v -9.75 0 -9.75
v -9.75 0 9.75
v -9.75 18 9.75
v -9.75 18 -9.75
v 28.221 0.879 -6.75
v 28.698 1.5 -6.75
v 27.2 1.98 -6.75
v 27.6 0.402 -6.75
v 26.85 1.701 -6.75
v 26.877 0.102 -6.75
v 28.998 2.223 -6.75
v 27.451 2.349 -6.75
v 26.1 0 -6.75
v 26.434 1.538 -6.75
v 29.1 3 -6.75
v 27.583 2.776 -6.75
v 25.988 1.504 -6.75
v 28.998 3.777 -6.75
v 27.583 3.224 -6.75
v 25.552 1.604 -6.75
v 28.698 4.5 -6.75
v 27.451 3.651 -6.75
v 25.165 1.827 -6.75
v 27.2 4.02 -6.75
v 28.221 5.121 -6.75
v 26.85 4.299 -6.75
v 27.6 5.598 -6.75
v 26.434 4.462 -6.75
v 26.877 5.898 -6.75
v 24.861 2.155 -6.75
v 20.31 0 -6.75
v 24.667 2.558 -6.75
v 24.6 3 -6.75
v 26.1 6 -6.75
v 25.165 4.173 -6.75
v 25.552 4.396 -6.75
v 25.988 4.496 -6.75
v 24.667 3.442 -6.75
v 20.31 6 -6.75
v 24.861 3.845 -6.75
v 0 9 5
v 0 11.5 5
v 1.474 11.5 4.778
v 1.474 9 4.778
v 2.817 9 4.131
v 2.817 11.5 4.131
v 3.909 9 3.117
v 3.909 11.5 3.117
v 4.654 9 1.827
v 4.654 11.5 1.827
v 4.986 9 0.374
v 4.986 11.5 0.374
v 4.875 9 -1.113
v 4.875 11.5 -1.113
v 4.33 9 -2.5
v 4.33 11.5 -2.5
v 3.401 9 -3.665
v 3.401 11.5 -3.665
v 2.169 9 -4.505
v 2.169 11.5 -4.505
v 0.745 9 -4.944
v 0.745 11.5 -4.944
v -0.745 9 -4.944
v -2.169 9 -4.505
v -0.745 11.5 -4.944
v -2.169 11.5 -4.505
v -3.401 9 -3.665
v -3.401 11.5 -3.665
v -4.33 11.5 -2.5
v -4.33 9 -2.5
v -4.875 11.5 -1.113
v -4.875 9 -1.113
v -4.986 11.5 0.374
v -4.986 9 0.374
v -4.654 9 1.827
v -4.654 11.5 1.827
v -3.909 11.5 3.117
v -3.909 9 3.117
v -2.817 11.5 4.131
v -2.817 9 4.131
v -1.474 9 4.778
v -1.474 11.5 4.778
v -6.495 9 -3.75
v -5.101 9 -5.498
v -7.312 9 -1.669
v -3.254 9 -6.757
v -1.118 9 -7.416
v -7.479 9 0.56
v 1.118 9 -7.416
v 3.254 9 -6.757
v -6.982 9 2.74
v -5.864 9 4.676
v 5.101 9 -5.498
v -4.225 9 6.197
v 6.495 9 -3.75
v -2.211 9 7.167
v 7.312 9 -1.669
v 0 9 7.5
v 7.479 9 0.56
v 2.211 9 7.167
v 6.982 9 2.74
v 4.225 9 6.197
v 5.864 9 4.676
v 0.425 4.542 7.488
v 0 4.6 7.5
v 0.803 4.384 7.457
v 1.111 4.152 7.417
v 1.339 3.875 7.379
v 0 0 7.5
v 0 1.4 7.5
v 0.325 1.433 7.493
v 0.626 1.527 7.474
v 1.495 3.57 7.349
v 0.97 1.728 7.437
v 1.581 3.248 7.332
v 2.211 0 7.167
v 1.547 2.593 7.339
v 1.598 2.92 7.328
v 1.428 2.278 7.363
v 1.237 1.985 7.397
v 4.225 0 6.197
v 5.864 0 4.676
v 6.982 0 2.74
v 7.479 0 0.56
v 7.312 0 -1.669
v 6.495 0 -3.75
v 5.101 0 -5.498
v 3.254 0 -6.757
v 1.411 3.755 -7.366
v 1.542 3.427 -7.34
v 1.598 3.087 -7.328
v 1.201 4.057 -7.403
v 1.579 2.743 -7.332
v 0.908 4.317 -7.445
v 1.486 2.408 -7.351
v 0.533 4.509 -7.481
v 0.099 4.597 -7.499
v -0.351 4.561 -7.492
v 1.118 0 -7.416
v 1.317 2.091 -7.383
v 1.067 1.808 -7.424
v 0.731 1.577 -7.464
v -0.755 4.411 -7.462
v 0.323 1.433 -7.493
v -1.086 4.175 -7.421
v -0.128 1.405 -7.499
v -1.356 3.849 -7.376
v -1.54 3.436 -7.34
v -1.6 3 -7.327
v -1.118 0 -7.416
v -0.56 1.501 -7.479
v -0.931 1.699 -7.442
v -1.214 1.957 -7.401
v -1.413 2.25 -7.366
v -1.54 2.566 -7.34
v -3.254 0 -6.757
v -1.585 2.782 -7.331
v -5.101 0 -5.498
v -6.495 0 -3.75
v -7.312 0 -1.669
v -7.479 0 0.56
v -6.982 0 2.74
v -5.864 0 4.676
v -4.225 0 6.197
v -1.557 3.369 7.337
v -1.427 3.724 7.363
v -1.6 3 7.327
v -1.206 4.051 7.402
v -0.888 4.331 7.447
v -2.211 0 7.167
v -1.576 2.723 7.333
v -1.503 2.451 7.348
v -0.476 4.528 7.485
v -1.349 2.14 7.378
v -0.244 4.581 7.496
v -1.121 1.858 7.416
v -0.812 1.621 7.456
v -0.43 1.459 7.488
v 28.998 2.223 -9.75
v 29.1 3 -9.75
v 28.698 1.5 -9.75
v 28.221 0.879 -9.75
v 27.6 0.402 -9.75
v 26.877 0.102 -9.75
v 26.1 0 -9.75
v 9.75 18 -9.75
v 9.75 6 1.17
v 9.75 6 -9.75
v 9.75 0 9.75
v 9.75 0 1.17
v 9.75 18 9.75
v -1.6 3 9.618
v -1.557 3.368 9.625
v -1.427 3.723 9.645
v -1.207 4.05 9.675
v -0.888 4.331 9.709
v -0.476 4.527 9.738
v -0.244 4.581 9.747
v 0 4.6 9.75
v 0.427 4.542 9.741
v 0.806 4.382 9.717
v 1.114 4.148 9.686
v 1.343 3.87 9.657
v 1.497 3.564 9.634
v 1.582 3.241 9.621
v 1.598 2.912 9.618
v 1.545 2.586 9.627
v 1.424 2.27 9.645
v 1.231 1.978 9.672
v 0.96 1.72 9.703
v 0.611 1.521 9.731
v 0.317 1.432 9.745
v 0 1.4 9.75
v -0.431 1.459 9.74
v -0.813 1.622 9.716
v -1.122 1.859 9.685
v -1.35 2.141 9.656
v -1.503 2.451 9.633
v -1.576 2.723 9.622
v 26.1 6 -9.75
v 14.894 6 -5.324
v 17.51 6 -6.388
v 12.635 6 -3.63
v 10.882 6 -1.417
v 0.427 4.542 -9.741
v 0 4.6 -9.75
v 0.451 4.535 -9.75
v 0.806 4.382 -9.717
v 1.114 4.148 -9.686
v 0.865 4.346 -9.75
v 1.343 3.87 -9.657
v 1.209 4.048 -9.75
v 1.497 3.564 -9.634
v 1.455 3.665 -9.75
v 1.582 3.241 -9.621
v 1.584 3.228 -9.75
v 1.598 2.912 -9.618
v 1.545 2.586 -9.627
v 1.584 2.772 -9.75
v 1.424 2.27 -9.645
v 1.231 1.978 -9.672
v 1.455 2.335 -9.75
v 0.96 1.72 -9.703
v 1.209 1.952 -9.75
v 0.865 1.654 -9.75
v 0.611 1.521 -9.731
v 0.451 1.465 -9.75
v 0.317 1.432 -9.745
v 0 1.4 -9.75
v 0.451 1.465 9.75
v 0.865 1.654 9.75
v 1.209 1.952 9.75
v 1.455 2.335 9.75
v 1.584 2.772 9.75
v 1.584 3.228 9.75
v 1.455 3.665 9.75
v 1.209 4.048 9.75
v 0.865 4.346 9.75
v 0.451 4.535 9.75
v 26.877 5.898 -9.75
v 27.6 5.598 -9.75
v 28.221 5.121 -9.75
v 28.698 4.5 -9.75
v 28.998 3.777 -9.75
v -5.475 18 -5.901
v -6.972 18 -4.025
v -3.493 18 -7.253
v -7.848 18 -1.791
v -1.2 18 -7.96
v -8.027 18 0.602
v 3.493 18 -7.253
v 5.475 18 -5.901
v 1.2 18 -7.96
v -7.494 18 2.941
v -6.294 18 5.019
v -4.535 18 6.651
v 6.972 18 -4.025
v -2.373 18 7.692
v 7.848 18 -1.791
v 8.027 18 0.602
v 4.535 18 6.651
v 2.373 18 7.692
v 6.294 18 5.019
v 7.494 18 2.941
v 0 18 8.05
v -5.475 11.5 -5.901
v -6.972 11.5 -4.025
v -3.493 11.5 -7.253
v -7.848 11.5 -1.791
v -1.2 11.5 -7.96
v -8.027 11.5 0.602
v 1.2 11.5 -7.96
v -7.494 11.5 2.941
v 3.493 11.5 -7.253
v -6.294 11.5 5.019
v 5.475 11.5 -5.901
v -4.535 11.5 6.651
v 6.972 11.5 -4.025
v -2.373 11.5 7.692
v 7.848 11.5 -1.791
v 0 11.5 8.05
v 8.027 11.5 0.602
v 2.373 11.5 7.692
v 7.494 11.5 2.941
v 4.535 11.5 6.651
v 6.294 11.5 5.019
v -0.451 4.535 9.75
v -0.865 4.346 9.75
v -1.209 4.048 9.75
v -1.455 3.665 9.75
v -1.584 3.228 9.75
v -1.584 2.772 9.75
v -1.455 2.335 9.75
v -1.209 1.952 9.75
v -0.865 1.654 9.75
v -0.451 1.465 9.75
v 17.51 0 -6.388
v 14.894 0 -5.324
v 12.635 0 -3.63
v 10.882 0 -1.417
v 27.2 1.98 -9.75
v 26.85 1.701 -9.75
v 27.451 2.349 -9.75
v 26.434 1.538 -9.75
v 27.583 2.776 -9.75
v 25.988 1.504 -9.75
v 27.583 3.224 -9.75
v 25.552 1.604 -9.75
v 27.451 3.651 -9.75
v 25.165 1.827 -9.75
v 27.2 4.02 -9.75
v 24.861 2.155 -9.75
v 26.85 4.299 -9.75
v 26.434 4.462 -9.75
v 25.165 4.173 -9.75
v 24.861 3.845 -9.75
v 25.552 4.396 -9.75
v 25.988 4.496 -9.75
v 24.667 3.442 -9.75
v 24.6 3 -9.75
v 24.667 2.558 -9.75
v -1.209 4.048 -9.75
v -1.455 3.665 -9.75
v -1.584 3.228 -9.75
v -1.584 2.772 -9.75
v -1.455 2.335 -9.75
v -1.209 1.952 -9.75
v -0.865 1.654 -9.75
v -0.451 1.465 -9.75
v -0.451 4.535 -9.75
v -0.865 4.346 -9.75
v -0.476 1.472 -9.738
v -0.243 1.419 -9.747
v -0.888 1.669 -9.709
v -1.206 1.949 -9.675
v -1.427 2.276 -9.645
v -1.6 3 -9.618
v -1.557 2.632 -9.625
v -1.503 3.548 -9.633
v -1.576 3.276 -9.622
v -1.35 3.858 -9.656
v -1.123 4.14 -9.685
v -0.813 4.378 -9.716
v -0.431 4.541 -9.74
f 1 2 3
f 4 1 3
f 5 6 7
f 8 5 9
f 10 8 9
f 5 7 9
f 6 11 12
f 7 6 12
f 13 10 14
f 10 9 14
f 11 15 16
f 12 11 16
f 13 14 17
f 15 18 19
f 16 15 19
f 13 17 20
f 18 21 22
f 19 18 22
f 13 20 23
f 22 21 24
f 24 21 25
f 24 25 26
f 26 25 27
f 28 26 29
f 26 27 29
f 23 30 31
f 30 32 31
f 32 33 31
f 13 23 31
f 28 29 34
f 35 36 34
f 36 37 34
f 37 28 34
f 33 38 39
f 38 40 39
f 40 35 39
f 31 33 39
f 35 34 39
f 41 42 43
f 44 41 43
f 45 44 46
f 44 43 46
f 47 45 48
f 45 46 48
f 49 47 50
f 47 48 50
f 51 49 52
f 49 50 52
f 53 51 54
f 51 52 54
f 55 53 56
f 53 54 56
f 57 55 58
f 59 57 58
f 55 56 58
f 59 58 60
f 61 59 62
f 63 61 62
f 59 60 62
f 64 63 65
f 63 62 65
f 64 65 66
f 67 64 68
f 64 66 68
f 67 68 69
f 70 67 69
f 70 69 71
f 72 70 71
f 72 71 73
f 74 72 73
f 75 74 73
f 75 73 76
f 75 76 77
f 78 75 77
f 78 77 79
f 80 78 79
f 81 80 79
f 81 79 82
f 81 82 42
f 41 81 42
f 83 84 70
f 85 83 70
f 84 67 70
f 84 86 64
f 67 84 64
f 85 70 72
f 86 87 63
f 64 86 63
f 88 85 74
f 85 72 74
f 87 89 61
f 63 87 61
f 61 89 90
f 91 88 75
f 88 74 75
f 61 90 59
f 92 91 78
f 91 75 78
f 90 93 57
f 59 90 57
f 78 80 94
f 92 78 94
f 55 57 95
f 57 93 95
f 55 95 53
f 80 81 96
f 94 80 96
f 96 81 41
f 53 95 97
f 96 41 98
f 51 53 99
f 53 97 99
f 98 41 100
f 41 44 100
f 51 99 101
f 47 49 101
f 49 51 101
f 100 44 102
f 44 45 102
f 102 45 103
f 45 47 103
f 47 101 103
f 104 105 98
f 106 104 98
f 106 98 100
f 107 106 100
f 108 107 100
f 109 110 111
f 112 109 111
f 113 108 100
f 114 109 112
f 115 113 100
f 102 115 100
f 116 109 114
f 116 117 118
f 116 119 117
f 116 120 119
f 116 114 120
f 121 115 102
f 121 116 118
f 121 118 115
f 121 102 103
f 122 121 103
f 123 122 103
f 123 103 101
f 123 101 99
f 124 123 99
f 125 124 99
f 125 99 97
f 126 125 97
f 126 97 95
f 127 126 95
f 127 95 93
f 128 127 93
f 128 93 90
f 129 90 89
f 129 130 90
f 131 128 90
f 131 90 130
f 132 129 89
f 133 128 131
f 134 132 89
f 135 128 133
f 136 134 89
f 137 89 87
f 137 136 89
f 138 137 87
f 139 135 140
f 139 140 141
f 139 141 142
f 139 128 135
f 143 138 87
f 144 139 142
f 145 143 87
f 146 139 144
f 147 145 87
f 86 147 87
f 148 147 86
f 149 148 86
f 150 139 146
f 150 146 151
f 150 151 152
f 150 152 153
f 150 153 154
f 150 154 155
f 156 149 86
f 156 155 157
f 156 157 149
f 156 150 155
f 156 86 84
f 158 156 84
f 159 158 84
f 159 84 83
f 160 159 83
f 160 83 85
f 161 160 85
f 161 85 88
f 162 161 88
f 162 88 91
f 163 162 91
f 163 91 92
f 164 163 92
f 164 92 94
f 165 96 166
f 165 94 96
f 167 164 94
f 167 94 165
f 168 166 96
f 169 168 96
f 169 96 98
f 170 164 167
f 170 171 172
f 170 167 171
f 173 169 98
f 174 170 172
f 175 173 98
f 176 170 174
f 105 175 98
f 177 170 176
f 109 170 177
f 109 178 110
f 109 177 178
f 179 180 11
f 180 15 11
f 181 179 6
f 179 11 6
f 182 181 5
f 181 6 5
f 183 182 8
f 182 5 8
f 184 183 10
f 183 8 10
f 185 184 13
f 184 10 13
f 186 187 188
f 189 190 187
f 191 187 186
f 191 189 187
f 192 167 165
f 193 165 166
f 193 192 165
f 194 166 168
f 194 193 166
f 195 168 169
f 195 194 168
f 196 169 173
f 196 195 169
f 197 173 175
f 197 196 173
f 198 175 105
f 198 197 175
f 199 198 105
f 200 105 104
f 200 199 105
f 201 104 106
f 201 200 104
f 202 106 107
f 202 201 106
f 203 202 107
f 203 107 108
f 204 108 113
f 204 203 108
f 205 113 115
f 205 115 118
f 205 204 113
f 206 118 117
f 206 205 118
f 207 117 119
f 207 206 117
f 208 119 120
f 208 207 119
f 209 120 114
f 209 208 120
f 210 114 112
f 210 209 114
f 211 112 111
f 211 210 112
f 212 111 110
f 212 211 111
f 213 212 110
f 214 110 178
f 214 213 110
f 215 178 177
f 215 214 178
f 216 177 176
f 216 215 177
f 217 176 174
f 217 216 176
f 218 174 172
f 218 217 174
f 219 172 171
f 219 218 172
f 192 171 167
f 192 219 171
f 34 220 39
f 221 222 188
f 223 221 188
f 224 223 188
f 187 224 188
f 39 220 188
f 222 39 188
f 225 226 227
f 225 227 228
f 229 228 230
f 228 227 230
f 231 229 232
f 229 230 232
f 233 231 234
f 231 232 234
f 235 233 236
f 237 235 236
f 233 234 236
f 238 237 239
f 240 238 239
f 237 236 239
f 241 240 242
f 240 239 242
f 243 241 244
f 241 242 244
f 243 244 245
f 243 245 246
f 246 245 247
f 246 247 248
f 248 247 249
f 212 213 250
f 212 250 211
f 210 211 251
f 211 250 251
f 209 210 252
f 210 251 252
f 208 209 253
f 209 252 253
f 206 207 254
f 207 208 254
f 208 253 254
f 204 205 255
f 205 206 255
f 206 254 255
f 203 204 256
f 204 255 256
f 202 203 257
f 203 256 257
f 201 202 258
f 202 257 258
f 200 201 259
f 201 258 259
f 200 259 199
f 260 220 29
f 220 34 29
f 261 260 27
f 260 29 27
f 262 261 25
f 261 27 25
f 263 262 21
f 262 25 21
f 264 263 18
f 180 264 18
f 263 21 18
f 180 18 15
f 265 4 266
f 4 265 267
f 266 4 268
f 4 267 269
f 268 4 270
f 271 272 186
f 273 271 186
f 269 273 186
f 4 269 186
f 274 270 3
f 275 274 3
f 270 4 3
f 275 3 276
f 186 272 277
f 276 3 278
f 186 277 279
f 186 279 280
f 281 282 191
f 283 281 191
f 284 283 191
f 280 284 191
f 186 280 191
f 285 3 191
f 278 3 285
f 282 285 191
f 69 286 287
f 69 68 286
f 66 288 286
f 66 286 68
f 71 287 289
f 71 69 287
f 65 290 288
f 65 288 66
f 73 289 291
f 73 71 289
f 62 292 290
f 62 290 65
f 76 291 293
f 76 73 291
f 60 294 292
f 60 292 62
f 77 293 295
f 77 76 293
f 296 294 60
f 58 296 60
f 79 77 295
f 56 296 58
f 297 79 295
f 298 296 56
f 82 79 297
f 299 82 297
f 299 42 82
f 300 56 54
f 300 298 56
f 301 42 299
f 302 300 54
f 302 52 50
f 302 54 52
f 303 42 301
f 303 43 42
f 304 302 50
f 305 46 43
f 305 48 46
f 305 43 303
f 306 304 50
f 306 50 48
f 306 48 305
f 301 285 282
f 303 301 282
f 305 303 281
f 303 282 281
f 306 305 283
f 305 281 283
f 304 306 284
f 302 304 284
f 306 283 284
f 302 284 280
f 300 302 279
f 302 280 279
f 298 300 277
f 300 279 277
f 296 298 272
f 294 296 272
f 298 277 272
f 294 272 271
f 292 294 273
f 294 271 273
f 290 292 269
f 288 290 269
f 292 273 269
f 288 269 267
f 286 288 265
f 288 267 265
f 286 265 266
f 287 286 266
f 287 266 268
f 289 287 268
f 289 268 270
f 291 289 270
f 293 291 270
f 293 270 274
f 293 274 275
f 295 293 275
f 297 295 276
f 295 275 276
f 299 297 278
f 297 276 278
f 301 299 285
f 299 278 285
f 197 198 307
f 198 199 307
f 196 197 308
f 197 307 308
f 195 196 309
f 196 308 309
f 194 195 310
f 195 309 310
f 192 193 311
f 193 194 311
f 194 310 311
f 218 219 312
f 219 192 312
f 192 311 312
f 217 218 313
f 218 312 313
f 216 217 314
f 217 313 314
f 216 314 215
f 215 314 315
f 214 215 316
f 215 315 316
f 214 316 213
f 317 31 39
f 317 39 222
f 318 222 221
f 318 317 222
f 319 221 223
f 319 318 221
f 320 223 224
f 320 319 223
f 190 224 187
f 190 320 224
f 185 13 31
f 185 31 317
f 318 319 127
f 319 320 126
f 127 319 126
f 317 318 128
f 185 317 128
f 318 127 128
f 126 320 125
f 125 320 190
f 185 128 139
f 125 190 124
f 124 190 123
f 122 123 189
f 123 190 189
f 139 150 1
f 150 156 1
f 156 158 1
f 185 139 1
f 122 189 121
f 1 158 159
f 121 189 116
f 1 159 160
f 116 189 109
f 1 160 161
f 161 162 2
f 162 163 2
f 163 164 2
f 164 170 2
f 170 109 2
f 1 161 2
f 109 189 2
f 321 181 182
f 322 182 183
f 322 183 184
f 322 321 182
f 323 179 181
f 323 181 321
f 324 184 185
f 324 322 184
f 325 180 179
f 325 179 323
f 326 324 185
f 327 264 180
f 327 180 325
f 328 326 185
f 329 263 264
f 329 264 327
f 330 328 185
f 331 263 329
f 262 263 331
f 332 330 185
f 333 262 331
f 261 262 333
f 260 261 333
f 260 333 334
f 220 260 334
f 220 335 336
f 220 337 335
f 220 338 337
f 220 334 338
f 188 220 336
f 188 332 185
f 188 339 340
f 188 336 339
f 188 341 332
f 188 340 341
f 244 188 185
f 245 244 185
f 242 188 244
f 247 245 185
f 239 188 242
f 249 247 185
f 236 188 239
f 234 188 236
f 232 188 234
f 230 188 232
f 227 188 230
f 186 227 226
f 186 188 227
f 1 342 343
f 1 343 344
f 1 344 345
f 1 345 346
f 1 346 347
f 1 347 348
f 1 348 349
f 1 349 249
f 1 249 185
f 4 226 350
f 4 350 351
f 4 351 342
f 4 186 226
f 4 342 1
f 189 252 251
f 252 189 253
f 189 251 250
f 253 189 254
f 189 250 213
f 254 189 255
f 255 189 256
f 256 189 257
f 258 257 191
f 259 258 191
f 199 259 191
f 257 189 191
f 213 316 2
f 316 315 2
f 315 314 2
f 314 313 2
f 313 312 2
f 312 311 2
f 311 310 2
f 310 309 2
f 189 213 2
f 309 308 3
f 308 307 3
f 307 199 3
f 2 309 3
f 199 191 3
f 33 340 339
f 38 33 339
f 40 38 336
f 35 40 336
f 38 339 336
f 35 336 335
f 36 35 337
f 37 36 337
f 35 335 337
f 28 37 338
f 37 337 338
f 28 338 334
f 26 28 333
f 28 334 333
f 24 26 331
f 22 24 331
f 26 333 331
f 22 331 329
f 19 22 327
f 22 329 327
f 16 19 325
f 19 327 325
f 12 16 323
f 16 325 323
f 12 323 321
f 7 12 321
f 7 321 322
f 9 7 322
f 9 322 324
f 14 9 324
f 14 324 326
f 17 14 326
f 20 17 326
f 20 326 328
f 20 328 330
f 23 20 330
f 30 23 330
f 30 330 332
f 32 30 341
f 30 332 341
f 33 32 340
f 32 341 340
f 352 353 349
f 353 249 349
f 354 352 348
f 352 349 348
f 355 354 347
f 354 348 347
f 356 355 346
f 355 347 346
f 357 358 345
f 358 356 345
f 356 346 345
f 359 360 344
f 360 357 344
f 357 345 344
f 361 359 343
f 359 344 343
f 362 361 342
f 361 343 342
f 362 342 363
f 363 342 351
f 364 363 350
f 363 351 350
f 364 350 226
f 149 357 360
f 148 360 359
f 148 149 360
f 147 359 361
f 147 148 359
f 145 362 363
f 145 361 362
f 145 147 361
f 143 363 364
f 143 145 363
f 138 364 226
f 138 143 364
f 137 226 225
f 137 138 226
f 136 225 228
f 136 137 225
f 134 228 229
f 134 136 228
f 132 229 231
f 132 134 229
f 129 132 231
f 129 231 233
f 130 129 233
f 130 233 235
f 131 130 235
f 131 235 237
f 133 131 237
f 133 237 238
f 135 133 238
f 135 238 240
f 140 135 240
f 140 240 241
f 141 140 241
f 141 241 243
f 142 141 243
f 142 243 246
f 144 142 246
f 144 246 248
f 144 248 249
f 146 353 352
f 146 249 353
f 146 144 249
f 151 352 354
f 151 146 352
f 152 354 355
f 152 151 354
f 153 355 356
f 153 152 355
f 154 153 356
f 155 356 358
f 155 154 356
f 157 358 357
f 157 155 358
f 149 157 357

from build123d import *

# Parameters (mm, degrees)
SKETCH1_R               = 9.75
BOSS_EXTRUDE1_DEPTH     = 18
SKETCH4_5_R             = 1.5
SKETCH4_5_R_2           = 1.6
BOSS_EXTRUDE3_DEPTH     = 3
BOSS_EXTRUDE5_REACH     = 41.383
SKETCH1_4_R             = 7.5
CUT_EXTRUDE2_DEPTH      = 9
CUT_EXTRUDE8_START      = 18
SKETCH1_6_R             = 8.05
CUT_EXTRUDE8_DEPTH      = 6.5
CUT_EXTRUDE5_DEPTH      = 40.383499083
CUT_EXTRUDE5_DEPTH_BACK = 40.383499083
SKETCH4_R               = 1.6
FILLET8_R               = 11
FILLET9_R               = 3
CUT_EXTRUDE9_START      = 11.5
SKETCH1_8_R             = 5
CUT_EXTRUDE9_DEPTH      = 4
BOSS_EXTRUDE6_REACH     = 41.383
SKETCH5_R               = 1.6


# Some blends are built 0.0001 mm under size
with BuildPart() as part:
    # Sketch1 → Boss-Extrude1 (new body)
    with BuildSketch(Plane(origin=(0, 0, 0), x_dir=(1, 0, 0), z_dir=(0, 1, 0))):
        with Locations(Location((0, 0, 0), (0, 0, 270))):
            Circle(SKETCH1_R)
    extrude(amount=BOSS_EXTRUDE1_DEPTH)

    # Sketch4<5> → Boss-Extrude3 (add)
    with BuildSketch(Plane(origin=(0, 0, -9.75), x_dir=(-1, 0, 0), z_dir=(0, 0, -1))):
        Polygon((-9.75, 18), (-9.75, 6), (-29.1, 6), (-29.1, 0), (9.75, 0), (9.75, 18), align=None)
        with Locations((-26.1, 3)):
            Circle(SKETCH4_5_R, mode=Mode.SUBTRACT)
        with Locations((0, 3)):
            Circle(SKETCH4_5_R_2, mode=Mode.SUBTRACT)
    extrude(amount=-BOSS_EXTRUDE3_DEPTH)

    # Sketch4<8> → Boss-Extrude5 (add, up to next)
    with BuildSketch(Plane(origin=(0, 0, -9.75), x_dir=(-1, 0, 0), z_dir=(0, 0, -1)), mode=Mode.PRIVATE) as boss_extrude5_sk1:
        with BuildLine():
            Line((0, 18), (-9.75, 18))
            Line((-9.75, 18), (-9.75, 6))
            Line((-9.75, 6), (-9.75, 0))
            Line((-9.75, 0), (0, 0))
            Line((0, 0), (0, 1.4))
            ThreePointArc((0, 1.4), (-1.6, 3), (0, 4.6))
            Line((0, 4.6), (0, 18))
        make_face()
    boss_extrude5_tool1 = extrude(boss_extrude5_sk1.sketch, amount=-BOSS_EXTRUDE5_REACH, mode=Mode.PRIVATE) - part.part
    # Sketch4<8> → Boss-Extrude5 (add, up to next)
    with BuildSketch(Plane(origin=(0, 0, -9.75), x_dir=(-1, 0, 0), z_dir=(0, 0, -1)), mode=Mode.PRIVATE) as boss_extrude5_sk2:
        with BuildLine():
            Line((9.75, 18), (0, 18))
            Line((0, 18), (0, 4.6))
            ThreePointArc((0, 4.6), (1.13137085, 4.13137085), (1.6, 3))
            ThreePointArc((1.6, 3), (1.13137085, 1.86862915), (0, 1.4))
            Line((0, 1.4), (0, 0))
            Line((0, 0), (9.75, 0))
            Line((9.75, 0), (9.75, 18))
        make_face()
    boss_extrude5_tool2 = extrude(boss_extrude5_sk2.sketch, amount=-BOSS_EXTRUDE5_REACH, mode=Mode.PRIVATE) - part.part
    add(boss_extrude5_tool1.solids().sort_by_distance((4.973396, 9.140702, -9.75))[0])
    add(boss_extrude5_tool2.solids().sort_by_distance((-4.973396, 9.140702, -9.75))[0])

    # Sketch1<4> → Cut-Extrude2 (cut)
    with BuildSketch(Plane(origin=(0, 0, 0), x_dir=(1, 0, 0), z_dir=(0, 1, 0))):
        with Locations(Location((0, 0, 0), (0, 0, 270))):
            Circle(SKETCH1_4_R)
    extrude(amount=CUT_EXTRUDE2_DEPTH, mode=Mode.SUBTRACT)

    # Sketch1<6> → Cut-Extrude8 (cut)
    with BuildSketch(Plane(origin=(0, 0, 0), x_dir=(1, 0, 0), z_dir=(0, 1, 0)).offset(CUT_EXTRUDE8_START)):
        with Locations(Location((0, 0, 0), (0, 0, 270))):
            Circle(SKETCH1_6_R)
    extrude(amount=-CUT_EXTRUDE8_DEPTH, mode=Mode.SUBTRACT)

    # Sketch4 → Cut-Extrude5 (cut, two sides: drawn at the far end of the back side and taken through both)
    with BuildSketch(Plane(origin=(0, 0, -9.75), x_dir=(-1, 0, 0), z_dir=(0, 0, -1)).offset(-CUT_EXTRUDE5_DEPTH_BACK)):
        with Locations((0, 3)):
            Circle(SKETCH4_R)
    extrude(amount=CUT_EXTRUDE5_DEPTH + CUT_EXTRUDE5_DEPTH_BACK, mode=Mode.SUBTRACT)

    # Fillet8
    # the kernel refuses this fillet: 11 mm, written as the material it adds along each edge
    with BuildSketch(Plane(origin=(9.75, 0, -6.75), x_dir=(1, 0, 0), z_dir=(0, 1, 0))) as fillet8_piece_1:
        with BuildLine():
            CenterArc((10.560096012, -11), FILLET8_R, 90, 78.18108009)
            Line((-0.206701874, -8.746987952), (-1.283381663, -8.521686747))
            ThreePointArc((-1.283381663, -8.521686747), (-1.1, -6.75), (-1.1, 0))
            Line((-1.1, 0), (0, 1.1))
            Line((0, 1.1), (10.560096012, 1.1))
            Line((10.560096012, 1.1), (10.560096012, 0))
        make_face()
    extrude(amount=6)

    # Fillet9
    fillet9_edges = [part.edges().sort_by_distance(p)[0] for p in [
        (29.1, 0, -8.25),
        (29.1, 6, -8.25),
    ]]
    fillet(fillet9_edges, radius=FILLET9_R - 0.0001)  # a hair under: the kernel refuses the full size

    # Sketch1<8> → Cut-Extrude9 (cut)
    with BuildSketch(Plane(origin=(0, 0, 0), x_dir=(1, 0, 0), z_dir=(0, 1, 0)).offset(CUT_EXTRUDE9_START)):
        with Locations(Location((0, 0, 0), (0, 0, 270))):
            Circle(SKETCH1_8_R)
    extrude(amount=-CUT_EXTRUDE9_DEPTH, mode=Mode.SUBTRACT)

    # Sketch5 → Boss-Extrude6 (add, up to next)
    with BuildSketch(Plane.XY.offset(9.75), mode=Mode.PRIVATE) as boss_extrude6_sk1:
        Polygon((9.75, 0), (-9.75, 0), (-9.75, 18), (9.75, 18), (9.75, 6), align=None)
        with Locations(Location((0, 3, 0), (0, 0, 180))):
            Circle(SKETCH5_R, mode=Mode.SUBTRACT)
    boss_extrude6_tool1 = extrude(boss_extrude6_sk1.sketch, amount=-BOSS_EXTRUDE6_REACH, mode=Mode.PRIVATE) - part.part
    add(boss_extrude6_tool1.solids().sort_by_distance((0, 9.140702, 9.75))[0])
    add(boss_extrude6_tool1.solids().sort_by_distance((0, 9.140702, 9.75))[1])


solid = part.part
